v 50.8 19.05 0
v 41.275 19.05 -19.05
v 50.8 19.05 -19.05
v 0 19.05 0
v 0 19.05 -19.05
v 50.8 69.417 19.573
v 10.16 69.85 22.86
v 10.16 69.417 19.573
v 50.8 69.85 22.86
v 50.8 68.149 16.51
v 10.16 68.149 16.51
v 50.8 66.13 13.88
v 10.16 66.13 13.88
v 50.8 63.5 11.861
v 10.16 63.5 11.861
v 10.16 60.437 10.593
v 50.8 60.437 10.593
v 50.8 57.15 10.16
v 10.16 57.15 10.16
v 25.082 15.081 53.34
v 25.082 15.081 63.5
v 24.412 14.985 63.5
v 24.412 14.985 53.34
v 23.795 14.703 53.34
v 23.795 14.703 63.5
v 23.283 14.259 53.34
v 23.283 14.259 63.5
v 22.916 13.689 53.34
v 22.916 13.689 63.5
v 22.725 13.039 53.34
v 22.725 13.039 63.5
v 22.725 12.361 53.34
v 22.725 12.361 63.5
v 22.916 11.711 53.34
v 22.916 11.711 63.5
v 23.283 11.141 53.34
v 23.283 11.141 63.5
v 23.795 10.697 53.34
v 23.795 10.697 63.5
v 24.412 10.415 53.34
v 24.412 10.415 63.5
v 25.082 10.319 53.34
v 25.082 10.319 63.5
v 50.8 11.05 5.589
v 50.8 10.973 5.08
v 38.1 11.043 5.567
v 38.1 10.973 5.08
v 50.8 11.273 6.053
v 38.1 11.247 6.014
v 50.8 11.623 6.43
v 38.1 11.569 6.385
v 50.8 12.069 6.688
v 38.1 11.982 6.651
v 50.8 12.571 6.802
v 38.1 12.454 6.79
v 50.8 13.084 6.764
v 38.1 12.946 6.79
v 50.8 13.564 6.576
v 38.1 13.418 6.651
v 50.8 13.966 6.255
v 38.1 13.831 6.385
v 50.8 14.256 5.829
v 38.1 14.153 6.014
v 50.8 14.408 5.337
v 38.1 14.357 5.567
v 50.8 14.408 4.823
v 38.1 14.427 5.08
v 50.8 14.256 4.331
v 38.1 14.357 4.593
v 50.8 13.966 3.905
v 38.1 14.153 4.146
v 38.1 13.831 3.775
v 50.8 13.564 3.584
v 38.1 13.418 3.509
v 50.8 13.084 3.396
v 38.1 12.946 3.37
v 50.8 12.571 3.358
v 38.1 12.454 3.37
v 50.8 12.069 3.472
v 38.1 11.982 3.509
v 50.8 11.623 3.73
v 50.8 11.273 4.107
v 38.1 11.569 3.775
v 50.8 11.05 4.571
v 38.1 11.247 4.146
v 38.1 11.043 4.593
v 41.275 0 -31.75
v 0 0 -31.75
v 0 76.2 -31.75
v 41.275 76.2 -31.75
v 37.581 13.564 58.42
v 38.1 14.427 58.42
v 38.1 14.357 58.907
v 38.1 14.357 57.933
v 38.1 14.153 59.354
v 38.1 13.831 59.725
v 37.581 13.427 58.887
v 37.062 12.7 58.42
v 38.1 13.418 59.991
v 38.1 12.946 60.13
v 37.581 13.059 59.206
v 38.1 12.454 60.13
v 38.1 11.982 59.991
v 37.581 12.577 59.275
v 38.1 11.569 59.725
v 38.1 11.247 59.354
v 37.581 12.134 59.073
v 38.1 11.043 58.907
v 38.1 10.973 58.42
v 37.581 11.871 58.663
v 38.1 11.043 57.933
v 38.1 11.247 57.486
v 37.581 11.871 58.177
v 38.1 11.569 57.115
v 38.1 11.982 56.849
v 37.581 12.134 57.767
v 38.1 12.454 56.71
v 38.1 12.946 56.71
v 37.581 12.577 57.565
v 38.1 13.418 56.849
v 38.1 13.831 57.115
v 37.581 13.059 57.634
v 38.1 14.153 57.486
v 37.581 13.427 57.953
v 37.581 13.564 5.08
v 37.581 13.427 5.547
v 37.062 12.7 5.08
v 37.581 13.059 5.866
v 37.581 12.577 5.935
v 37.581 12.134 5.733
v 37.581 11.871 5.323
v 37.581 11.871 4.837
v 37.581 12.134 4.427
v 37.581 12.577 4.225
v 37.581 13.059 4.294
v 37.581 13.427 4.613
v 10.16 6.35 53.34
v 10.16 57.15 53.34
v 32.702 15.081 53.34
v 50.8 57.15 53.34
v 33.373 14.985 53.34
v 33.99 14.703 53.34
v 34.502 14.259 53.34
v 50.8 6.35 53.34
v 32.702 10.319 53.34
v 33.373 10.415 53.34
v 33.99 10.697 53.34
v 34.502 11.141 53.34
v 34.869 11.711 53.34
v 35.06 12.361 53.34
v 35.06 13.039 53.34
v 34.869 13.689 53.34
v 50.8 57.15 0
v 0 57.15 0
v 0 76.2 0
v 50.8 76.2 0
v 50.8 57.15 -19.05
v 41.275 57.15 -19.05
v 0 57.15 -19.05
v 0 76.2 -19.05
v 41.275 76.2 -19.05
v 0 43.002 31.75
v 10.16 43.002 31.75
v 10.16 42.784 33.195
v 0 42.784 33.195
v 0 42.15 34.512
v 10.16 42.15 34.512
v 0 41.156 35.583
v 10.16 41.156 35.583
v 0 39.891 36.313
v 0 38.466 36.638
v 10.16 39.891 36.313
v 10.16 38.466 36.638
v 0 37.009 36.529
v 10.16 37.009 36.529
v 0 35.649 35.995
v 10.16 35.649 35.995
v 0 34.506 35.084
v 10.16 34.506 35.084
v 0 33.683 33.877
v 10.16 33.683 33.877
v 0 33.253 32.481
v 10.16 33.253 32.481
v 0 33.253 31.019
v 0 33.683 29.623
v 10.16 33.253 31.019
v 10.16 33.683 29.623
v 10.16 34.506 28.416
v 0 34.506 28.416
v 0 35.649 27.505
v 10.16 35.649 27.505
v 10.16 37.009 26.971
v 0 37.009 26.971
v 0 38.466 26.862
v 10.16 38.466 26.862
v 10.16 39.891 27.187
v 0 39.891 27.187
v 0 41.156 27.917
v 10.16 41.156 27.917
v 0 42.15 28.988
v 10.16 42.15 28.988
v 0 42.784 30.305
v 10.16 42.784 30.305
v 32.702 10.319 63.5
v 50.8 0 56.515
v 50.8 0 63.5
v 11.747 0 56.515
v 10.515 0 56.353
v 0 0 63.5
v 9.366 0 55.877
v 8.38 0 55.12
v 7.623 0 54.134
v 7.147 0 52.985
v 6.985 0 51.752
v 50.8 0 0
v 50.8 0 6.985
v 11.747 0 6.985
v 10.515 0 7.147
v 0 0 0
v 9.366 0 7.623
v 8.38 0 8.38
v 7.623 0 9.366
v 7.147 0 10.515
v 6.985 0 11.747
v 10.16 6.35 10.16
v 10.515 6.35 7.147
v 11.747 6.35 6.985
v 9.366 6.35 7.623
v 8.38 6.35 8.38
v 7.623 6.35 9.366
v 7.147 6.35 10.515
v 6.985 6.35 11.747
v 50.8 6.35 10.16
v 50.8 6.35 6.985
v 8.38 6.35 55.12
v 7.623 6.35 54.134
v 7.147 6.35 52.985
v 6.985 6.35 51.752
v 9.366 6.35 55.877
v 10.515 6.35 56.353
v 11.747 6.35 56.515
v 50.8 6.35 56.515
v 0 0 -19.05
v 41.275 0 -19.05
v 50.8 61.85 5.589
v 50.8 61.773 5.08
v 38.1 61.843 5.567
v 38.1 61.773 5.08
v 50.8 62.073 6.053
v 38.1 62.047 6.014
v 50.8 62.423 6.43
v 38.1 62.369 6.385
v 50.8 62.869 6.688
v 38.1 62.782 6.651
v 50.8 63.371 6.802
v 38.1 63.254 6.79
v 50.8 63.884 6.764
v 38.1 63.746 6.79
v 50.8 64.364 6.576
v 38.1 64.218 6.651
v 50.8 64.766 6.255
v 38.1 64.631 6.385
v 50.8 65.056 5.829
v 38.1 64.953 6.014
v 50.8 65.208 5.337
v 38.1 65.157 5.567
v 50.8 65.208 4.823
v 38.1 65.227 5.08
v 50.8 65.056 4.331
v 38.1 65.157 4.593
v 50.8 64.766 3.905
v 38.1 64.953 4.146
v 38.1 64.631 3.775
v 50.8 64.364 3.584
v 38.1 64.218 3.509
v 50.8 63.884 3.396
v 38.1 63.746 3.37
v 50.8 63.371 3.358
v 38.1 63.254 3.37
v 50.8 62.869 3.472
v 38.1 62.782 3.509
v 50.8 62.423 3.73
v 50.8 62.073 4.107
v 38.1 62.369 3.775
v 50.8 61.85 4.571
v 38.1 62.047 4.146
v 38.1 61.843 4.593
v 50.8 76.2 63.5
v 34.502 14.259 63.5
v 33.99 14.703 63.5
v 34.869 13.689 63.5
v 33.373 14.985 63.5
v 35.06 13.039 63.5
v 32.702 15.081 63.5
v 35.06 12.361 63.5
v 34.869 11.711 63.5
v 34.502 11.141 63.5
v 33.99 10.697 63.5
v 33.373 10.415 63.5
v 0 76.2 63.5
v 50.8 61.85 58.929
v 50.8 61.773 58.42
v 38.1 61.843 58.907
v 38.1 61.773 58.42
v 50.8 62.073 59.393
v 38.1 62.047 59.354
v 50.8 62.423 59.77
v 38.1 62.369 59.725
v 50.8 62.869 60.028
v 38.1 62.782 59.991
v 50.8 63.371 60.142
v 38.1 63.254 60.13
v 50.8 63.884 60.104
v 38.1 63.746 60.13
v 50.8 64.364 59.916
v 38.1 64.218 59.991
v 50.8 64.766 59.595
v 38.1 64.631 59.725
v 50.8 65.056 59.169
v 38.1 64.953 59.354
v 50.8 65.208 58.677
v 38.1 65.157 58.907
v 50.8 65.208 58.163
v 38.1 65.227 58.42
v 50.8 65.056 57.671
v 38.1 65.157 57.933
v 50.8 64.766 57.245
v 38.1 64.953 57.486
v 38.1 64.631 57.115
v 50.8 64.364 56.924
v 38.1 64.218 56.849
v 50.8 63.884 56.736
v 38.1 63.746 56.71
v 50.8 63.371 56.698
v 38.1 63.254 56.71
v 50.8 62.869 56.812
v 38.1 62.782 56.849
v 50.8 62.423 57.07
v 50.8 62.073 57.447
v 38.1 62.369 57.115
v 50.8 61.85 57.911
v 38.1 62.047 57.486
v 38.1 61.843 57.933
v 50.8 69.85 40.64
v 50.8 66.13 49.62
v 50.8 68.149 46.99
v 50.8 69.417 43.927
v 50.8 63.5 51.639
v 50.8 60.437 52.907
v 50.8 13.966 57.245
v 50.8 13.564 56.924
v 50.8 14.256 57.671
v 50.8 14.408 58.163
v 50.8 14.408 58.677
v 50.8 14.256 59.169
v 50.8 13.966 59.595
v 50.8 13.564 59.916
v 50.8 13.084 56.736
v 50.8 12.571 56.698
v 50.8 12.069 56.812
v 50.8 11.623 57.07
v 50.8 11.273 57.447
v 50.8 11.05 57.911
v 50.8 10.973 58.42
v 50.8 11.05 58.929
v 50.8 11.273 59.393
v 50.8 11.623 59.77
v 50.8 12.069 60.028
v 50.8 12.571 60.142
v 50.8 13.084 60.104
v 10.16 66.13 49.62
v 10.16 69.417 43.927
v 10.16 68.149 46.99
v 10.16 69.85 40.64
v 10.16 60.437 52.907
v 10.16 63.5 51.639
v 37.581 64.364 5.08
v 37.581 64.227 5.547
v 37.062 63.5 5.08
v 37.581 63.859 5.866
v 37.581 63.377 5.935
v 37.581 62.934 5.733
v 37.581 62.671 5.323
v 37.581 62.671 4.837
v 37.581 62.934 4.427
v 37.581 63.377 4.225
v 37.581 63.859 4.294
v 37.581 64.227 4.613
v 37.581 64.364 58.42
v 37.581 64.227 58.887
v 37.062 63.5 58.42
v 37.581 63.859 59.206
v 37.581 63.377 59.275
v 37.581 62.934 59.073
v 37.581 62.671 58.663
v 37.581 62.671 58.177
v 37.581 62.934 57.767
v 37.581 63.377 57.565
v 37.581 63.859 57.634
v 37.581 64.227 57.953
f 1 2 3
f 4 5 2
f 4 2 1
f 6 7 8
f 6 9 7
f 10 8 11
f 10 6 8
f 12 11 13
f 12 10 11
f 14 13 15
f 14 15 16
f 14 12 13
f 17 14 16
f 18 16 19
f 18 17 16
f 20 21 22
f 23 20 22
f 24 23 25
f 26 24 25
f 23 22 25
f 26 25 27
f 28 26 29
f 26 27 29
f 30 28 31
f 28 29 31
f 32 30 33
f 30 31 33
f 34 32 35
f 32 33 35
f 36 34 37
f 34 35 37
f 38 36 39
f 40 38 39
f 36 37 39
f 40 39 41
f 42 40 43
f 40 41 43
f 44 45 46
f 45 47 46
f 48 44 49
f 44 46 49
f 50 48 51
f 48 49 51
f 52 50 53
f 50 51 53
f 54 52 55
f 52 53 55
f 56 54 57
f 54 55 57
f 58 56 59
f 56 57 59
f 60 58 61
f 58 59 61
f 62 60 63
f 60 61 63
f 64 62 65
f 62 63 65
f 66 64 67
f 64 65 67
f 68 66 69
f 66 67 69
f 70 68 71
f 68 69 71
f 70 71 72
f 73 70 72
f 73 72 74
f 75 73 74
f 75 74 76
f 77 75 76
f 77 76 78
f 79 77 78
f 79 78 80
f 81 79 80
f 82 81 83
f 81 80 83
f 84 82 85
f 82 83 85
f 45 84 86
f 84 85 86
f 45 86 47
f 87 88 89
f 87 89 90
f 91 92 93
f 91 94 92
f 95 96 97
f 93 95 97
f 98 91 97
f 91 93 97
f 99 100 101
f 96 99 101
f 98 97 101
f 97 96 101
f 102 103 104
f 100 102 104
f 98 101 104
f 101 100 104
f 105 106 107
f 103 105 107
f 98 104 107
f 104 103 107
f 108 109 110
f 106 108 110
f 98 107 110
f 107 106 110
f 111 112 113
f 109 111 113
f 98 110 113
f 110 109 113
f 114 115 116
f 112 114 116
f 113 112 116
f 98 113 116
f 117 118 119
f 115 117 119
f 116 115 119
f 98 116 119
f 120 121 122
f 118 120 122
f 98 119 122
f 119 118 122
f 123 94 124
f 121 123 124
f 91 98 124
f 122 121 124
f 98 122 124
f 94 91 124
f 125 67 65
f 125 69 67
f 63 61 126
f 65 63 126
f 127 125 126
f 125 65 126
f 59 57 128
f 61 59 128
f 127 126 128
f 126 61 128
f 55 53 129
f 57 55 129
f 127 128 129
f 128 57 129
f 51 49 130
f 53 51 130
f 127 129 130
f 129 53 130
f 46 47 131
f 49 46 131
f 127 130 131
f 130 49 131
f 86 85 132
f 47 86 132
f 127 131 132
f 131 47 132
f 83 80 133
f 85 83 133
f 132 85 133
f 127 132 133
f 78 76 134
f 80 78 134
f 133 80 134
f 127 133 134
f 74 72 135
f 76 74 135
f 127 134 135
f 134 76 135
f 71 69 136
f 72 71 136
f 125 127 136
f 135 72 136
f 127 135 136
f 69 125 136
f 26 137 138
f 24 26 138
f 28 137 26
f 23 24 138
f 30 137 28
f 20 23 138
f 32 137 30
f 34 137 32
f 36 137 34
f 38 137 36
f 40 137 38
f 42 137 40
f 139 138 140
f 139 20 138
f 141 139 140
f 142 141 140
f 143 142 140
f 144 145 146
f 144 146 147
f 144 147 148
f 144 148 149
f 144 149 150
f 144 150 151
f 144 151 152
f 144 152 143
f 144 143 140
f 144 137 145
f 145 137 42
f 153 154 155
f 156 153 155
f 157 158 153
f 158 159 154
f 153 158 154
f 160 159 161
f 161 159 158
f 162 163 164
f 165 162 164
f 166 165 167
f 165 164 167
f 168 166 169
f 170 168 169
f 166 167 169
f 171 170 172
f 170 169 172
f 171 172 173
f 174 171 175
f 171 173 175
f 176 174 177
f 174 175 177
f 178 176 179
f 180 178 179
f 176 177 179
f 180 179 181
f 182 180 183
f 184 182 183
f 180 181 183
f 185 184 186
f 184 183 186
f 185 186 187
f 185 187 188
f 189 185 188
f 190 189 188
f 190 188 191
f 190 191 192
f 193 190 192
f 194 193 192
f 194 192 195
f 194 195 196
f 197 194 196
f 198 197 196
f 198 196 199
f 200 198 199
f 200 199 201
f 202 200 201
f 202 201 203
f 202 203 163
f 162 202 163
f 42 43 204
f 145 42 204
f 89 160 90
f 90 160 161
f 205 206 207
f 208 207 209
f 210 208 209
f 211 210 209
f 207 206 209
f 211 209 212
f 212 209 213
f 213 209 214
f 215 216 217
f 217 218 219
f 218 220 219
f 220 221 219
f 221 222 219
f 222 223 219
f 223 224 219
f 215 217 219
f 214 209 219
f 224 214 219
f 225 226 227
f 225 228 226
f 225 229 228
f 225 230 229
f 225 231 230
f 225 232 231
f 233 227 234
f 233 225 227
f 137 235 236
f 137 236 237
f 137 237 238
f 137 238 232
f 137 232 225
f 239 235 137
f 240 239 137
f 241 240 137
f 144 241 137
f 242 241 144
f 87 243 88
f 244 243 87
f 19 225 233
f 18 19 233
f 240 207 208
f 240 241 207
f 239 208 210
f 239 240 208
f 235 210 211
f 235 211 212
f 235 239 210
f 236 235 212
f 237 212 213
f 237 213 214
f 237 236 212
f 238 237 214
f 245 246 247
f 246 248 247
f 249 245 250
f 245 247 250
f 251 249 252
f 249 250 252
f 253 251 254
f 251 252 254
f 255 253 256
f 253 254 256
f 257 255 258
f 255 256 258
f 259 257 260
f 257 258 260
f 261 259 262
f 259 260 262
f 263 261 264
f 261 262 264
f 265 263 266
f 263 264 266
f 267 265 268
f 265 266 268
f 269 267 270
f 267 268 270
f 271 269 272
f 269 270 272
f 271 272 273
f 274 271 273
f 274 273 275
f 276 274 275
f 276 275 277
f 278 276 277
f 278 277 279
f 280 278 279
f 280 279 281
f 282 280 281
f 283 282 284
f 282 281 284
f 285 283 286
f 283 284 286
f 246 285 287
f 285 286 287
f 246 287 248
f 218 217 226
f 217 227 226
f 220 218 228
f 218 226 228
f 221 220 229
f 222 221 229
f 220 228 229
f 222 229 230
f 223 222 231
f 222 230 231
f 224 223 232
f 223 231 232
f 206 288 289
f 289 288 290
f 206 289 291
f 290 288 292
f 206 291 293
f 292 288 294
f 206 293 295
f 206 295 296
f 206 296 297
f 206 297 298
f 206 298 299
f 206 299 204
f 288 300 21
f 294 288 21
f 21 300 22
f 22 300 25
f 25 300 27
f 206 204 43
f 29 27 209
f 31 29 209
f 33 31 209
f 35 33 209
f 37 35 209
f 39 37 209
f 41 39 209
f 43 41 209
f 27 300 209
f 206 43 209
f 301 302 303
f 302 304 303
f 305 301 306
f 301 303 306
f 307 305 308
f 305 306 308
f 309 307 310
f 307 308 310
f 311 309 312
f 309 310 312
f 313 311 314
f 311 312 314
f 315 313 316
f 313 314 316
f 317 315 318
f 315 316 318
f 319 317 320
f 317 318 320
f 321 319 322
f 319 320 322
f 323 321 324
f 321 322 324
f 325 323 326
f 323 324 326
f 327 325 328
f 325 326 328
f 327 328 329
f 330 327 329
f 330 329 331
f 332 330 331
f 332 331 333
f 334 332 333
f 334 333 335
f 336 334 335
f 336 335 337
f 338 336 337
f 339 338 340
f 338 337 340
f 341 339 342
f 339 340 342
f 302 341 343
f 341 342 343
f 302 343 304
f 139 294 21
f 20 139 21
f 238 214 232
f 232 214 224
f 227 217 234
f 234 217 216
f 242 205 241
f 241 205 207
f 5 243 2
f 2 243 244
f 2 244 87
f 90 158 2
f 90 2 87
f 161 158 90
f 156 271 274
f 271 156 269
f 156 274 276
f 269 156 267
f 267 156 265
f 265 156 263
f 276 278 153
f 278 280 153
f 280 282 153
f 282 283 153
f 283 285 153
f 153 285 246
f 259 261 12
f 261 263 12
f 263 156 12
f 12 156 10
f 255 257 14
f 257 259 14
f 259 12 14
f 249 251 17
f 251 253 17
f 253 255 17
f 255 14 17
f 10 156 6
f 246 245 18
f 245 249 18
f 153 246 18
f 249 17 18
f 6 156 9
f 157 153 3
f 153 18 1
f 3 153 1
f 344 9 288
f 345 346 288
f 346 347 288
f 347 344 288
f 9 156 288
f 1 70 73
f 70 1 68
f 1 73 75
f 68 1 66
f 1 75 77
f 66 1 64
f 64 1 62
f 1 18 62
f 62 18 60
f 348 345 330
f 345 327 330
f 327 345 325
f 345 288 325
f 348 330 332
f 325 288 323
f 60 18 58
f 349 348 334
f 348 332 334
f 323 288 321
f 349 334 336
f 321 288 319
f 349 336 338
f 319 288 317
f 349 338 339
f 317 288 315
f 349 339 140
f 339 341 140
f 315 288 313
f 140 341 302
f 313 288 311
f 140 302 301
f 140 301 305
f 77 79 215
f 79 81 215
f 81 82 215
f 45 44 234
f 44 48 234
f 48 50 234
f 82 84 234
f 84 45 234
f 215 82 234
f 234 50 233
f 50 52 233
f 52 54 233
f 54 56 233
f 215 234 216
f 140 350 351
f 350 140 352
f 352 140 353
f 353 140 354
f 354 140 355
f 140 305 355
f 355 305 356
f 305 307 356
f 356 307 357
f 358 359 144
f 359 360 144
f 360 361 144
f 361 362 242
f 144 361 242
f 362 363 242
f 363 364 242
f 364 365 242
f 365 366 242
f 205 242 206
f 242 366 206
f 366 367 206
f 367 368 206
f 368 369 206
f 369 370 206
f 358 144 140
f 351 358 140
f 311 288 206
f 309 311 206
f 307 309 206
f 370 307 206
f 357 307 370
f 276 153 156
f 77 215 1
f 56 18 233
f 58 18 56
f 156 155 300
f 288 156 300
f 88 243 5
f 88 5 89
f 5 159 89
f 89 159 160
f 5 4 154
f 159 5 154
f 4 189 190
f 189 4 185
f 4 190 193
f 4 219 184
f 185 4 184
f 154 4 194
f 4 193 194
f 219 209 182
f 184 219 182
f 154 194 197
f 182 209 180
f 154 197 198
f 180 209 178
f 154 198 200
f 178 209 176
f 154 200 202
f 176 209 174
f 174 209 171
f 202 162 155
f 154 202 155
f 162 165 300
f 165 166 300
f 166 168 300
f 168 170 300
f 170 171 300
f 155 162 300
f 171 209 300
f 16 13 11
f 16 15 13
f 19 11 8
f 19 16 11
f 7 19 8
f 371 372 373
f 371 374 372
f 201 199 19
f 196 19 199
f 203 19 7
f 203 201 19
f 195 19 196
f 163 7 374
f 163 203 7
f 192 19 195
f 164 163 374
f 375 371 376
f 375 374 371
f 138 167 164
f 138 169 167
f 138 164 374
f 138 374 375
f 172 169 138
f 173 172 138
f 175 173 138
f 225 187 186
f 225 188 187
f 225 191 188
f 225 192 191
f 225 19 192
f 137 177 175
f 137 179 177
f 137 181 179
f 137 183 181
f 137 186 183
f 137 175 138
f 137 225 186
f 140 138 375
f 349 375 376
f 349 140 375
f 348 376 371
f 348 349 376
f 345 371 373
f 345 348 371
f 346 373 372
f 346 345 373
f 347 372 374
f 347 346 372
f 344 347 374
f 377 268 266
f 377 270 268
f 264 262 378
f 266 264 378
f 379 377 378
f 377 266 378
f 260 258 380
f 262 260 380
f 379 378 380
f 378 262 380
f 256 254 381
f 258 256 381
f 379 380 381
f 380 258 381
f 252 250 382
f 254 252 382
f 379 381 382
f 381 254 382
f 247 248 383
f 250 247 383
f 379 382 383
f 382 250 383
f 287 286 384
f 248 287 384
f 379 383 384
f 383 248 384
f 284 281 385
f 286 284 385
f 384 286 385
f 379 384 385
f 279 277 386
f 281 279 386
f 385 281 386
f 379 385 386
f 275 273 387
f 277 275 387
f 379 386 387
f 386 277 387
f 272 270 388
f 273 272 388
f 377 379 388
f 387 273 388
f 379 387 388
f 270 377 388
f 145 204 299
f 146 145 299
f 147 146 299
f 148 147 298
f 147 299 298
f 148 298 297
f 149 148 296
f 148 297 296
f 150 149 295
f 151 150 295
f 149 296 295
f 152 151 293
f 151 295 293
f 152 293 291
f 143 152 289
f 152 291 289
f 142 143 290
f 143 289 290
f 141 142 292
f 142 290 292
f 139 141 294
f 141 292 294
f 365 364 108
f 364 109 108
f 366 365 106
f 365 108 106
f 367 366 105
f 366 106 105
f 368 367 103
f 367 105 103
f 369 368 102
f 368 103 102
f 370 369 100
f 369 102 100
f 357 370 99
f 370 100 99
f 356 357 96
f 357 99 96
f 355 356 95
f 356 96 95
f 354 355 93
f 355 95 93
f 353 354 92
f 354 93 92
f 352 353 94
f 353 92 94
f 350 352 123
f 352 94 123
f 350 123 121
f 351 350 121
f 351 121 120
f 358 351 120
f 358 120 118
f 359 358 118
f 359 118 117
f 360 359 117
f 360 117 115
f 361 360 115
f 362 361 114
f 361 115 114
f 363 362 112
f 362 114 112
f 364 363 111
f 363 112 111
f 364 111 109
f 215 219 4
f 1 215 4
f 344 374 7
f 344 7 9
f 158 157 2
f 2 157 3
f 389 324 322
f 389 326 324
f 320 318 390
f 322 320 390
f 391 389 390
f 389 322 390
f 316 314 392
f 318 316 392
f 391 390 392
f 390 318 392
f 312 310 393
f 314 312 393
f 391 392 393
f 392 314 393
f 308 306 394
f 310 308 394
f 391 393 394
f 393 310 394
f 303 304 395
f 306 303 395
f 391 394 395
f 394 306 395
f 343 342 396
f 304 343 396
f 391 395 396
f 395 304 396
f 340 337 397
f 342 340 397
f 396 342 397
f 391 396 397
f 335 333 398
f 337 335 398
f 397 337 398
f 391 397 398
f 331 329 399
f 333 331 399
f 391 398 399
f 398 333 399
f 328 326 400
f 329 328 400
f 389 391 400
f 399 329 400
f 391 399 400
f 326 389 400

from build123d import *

# Parameters (mm, degrees)
F0_W      = 38.1
F0_H      = 19.05
F1_DEPTH  = 50.8
F3_D      = 9.8044
F4_W      = 50.8
F4_H      = 19.05
F4_H_2    = 38.1
F5_DEPTH  = 12.7
F7_W      = 40.64
F7_H      = 43.18
F8_DEPTH  = 69.85
F9_W      = 40.64
F9_H      = 43.18
F10_DEPTH = 6.35
F12_DEPTH = 9.525
F14_D     = 3.4544
F14_DEPTH = 12.7
F14_TIP   = 1.0378064612
F15_R     = 12.7
F16_R     = 12.7
F17_R     = 4.7625
F19_DEPTH = 25.4


with BuildPart() as f1:
    # F0 (on Right) → F1 (new body)
    with BuildSketch(Plane.YZ):
        Polygon((0, 63.5), (0, 0), (19.05, 0), (57.15, 0), (76.2, 0), (76.2, 63.5), align=None)
        with Locations((38.1, -9.525)):
            Rectangle(F0_W, F0_H)
    extrude(amount=F1_DEPTH)

    # F3 (through all)
    with Locations(Plane(origin=(0, 0, 0), x_dir=(0, -1, 0), z_dir=(-1, 0, 0))):
        with Locations((-38.1, 31.75)):
            Hole(F3_D / 2)

    # F4 (on face) → F5 (join)
    with BuildSketch(Plane(origin=(0, 0, -19.05), x_dir=(1, 0, 0), z_dir=(0, 0, -1))):
        with Locations((25.4, -9.525)):
            Rectangle(F4_W, F4_H)
        with Locations((25.4, -66.675)):
            Rectangle(F4_W, F4_H)
        with Locations((25.4, -38.1)):
            Rectangle(F4_W, F4_H_2)
    extrude(amount=F5_DEPTH)

    # F7 (on face) → F8 (cut)
    with BuildSketch(Plane.XZ):
        with Locations((30.48, 31.75)):
            Rectangle(F7_W, F7_H)
    extrude(amount=-F8_DEPTH, mode=Mode.SUBTRACT)

    # F9 (on face) → F10 (cut)
    with BuildSketch(Plane.XZ):
        with Locations((30.48, 31.75)):
            Rectangle(F9_W, F9_H)
        Polygon((50.8, 53.34), (50.8, 56.515), (6.985, 56.515), (6.985, 6.985), (50.8, 6.985), (50.8, 10.16), (10.16, 10.16), (10.16, 53.34), align=None)
    extrude(amount=-F10_DEPTH, mode=Mode.SUBTRACT)

    # F11 (on face) → F12 (cut)
    with BuildSketch(Plane.YZ.offset(50.8)):
        Polygon((19.05, -19.05), (0, -19.05), (0, -31.75), (76.2, -31.75), (76.2, -19.05), (57.15, -19.05), align=None)
    extrude(amount=-F12_DEPTH, mode=Mode.SUBTRACT)

    # F14
    with Locations(Plane.YZ.offset(50.8)):
        with Locations((12.7, 58.42), (63.5, 58.42), (12.7, 5.08), (63.5, 5.08)):
            Hole(F14_D / 2, depth=F14_DEPTH)
            with Locations((0, 0, -(F14_DEPTH + F14_TIP / 2))):  # 118° drill point
                Cone(0, F14_D / 2, F14_TIP, mode=Mode.SUBTRACT)

    # F15
    f15_edges = [f1.edges().sort_by_distance(p)[0] for p in [
        (30.48, 69.85, 53.34),
    ]]
    fillet(f15_edges, radius=F15_R)

    # F16
    f16_edges = [f1.edges().sort_by_distance(p)[0] for p in [
        (30.48, 69.85, 10.16),
    ]]
    fillet(f16_edges, radius=F16_R)

    # F17
    f17_edges = [f1.edges().sort_by_distance(p)[0] for p in [
        (6.985, 3.175, 56.515),
        (6.985, 3.175, 6.985),
    ]]
    fillet(f17_edges, radius=F17_R)

    # F18 (on face) → F19 (cut)
    with BuildSketch(Plane.XY.offset(63.5)):
        with BuildLine():
            ThreePointArc((25.0825, 15.08125), (26.7662980227, 14.3837980227), (27.46375, 12.7))
            ThreePointArc((27.46375, 12.7), (26.7662980227, 11.0162019773), (25.0825, 10.31875))
            Line((25.0825, 10.31875), (32.7025, 10.31875))
            ThreePointArc((32.7025, 10.31875), (30.32125, 12.7), (32.7025, 15.08125))
            Line((32.7025, 15.08125), (25.0825, 15.08125))
        make_face()
        with BuildLine():
            ThreePointArc((35.08375, 12.7), (34.3862980227, 14.3837980227), (32.7025, 15.08125))
            ThreePointArc((32.7025, 15.08125), (30.32125, 12.7), (32.7025, 10.31875))
            ThreePointArc((32.7025, 10.31875), (34.3862980227, 11.0162019773), (35.08375, 12.7))
        make_face()
        with BuildLine():
            ThreePointArc((25.0825, 10.31875), (26.7662980227, 11.0162019773), (27.46375, 12.7))
            ThreePointArc((27.46375, 12.7), (26.7662980227, 14.3837980227), (25.0825, 15.08125))
            ThreePointArc((25.0825, 15.08125), (22.70125, 12.7), (25.0825, 10.31875))
        make_face()
    extrude(amount=-F19_DEPTH, mode=Mode.SUBTRACT)


solid = f1.part
